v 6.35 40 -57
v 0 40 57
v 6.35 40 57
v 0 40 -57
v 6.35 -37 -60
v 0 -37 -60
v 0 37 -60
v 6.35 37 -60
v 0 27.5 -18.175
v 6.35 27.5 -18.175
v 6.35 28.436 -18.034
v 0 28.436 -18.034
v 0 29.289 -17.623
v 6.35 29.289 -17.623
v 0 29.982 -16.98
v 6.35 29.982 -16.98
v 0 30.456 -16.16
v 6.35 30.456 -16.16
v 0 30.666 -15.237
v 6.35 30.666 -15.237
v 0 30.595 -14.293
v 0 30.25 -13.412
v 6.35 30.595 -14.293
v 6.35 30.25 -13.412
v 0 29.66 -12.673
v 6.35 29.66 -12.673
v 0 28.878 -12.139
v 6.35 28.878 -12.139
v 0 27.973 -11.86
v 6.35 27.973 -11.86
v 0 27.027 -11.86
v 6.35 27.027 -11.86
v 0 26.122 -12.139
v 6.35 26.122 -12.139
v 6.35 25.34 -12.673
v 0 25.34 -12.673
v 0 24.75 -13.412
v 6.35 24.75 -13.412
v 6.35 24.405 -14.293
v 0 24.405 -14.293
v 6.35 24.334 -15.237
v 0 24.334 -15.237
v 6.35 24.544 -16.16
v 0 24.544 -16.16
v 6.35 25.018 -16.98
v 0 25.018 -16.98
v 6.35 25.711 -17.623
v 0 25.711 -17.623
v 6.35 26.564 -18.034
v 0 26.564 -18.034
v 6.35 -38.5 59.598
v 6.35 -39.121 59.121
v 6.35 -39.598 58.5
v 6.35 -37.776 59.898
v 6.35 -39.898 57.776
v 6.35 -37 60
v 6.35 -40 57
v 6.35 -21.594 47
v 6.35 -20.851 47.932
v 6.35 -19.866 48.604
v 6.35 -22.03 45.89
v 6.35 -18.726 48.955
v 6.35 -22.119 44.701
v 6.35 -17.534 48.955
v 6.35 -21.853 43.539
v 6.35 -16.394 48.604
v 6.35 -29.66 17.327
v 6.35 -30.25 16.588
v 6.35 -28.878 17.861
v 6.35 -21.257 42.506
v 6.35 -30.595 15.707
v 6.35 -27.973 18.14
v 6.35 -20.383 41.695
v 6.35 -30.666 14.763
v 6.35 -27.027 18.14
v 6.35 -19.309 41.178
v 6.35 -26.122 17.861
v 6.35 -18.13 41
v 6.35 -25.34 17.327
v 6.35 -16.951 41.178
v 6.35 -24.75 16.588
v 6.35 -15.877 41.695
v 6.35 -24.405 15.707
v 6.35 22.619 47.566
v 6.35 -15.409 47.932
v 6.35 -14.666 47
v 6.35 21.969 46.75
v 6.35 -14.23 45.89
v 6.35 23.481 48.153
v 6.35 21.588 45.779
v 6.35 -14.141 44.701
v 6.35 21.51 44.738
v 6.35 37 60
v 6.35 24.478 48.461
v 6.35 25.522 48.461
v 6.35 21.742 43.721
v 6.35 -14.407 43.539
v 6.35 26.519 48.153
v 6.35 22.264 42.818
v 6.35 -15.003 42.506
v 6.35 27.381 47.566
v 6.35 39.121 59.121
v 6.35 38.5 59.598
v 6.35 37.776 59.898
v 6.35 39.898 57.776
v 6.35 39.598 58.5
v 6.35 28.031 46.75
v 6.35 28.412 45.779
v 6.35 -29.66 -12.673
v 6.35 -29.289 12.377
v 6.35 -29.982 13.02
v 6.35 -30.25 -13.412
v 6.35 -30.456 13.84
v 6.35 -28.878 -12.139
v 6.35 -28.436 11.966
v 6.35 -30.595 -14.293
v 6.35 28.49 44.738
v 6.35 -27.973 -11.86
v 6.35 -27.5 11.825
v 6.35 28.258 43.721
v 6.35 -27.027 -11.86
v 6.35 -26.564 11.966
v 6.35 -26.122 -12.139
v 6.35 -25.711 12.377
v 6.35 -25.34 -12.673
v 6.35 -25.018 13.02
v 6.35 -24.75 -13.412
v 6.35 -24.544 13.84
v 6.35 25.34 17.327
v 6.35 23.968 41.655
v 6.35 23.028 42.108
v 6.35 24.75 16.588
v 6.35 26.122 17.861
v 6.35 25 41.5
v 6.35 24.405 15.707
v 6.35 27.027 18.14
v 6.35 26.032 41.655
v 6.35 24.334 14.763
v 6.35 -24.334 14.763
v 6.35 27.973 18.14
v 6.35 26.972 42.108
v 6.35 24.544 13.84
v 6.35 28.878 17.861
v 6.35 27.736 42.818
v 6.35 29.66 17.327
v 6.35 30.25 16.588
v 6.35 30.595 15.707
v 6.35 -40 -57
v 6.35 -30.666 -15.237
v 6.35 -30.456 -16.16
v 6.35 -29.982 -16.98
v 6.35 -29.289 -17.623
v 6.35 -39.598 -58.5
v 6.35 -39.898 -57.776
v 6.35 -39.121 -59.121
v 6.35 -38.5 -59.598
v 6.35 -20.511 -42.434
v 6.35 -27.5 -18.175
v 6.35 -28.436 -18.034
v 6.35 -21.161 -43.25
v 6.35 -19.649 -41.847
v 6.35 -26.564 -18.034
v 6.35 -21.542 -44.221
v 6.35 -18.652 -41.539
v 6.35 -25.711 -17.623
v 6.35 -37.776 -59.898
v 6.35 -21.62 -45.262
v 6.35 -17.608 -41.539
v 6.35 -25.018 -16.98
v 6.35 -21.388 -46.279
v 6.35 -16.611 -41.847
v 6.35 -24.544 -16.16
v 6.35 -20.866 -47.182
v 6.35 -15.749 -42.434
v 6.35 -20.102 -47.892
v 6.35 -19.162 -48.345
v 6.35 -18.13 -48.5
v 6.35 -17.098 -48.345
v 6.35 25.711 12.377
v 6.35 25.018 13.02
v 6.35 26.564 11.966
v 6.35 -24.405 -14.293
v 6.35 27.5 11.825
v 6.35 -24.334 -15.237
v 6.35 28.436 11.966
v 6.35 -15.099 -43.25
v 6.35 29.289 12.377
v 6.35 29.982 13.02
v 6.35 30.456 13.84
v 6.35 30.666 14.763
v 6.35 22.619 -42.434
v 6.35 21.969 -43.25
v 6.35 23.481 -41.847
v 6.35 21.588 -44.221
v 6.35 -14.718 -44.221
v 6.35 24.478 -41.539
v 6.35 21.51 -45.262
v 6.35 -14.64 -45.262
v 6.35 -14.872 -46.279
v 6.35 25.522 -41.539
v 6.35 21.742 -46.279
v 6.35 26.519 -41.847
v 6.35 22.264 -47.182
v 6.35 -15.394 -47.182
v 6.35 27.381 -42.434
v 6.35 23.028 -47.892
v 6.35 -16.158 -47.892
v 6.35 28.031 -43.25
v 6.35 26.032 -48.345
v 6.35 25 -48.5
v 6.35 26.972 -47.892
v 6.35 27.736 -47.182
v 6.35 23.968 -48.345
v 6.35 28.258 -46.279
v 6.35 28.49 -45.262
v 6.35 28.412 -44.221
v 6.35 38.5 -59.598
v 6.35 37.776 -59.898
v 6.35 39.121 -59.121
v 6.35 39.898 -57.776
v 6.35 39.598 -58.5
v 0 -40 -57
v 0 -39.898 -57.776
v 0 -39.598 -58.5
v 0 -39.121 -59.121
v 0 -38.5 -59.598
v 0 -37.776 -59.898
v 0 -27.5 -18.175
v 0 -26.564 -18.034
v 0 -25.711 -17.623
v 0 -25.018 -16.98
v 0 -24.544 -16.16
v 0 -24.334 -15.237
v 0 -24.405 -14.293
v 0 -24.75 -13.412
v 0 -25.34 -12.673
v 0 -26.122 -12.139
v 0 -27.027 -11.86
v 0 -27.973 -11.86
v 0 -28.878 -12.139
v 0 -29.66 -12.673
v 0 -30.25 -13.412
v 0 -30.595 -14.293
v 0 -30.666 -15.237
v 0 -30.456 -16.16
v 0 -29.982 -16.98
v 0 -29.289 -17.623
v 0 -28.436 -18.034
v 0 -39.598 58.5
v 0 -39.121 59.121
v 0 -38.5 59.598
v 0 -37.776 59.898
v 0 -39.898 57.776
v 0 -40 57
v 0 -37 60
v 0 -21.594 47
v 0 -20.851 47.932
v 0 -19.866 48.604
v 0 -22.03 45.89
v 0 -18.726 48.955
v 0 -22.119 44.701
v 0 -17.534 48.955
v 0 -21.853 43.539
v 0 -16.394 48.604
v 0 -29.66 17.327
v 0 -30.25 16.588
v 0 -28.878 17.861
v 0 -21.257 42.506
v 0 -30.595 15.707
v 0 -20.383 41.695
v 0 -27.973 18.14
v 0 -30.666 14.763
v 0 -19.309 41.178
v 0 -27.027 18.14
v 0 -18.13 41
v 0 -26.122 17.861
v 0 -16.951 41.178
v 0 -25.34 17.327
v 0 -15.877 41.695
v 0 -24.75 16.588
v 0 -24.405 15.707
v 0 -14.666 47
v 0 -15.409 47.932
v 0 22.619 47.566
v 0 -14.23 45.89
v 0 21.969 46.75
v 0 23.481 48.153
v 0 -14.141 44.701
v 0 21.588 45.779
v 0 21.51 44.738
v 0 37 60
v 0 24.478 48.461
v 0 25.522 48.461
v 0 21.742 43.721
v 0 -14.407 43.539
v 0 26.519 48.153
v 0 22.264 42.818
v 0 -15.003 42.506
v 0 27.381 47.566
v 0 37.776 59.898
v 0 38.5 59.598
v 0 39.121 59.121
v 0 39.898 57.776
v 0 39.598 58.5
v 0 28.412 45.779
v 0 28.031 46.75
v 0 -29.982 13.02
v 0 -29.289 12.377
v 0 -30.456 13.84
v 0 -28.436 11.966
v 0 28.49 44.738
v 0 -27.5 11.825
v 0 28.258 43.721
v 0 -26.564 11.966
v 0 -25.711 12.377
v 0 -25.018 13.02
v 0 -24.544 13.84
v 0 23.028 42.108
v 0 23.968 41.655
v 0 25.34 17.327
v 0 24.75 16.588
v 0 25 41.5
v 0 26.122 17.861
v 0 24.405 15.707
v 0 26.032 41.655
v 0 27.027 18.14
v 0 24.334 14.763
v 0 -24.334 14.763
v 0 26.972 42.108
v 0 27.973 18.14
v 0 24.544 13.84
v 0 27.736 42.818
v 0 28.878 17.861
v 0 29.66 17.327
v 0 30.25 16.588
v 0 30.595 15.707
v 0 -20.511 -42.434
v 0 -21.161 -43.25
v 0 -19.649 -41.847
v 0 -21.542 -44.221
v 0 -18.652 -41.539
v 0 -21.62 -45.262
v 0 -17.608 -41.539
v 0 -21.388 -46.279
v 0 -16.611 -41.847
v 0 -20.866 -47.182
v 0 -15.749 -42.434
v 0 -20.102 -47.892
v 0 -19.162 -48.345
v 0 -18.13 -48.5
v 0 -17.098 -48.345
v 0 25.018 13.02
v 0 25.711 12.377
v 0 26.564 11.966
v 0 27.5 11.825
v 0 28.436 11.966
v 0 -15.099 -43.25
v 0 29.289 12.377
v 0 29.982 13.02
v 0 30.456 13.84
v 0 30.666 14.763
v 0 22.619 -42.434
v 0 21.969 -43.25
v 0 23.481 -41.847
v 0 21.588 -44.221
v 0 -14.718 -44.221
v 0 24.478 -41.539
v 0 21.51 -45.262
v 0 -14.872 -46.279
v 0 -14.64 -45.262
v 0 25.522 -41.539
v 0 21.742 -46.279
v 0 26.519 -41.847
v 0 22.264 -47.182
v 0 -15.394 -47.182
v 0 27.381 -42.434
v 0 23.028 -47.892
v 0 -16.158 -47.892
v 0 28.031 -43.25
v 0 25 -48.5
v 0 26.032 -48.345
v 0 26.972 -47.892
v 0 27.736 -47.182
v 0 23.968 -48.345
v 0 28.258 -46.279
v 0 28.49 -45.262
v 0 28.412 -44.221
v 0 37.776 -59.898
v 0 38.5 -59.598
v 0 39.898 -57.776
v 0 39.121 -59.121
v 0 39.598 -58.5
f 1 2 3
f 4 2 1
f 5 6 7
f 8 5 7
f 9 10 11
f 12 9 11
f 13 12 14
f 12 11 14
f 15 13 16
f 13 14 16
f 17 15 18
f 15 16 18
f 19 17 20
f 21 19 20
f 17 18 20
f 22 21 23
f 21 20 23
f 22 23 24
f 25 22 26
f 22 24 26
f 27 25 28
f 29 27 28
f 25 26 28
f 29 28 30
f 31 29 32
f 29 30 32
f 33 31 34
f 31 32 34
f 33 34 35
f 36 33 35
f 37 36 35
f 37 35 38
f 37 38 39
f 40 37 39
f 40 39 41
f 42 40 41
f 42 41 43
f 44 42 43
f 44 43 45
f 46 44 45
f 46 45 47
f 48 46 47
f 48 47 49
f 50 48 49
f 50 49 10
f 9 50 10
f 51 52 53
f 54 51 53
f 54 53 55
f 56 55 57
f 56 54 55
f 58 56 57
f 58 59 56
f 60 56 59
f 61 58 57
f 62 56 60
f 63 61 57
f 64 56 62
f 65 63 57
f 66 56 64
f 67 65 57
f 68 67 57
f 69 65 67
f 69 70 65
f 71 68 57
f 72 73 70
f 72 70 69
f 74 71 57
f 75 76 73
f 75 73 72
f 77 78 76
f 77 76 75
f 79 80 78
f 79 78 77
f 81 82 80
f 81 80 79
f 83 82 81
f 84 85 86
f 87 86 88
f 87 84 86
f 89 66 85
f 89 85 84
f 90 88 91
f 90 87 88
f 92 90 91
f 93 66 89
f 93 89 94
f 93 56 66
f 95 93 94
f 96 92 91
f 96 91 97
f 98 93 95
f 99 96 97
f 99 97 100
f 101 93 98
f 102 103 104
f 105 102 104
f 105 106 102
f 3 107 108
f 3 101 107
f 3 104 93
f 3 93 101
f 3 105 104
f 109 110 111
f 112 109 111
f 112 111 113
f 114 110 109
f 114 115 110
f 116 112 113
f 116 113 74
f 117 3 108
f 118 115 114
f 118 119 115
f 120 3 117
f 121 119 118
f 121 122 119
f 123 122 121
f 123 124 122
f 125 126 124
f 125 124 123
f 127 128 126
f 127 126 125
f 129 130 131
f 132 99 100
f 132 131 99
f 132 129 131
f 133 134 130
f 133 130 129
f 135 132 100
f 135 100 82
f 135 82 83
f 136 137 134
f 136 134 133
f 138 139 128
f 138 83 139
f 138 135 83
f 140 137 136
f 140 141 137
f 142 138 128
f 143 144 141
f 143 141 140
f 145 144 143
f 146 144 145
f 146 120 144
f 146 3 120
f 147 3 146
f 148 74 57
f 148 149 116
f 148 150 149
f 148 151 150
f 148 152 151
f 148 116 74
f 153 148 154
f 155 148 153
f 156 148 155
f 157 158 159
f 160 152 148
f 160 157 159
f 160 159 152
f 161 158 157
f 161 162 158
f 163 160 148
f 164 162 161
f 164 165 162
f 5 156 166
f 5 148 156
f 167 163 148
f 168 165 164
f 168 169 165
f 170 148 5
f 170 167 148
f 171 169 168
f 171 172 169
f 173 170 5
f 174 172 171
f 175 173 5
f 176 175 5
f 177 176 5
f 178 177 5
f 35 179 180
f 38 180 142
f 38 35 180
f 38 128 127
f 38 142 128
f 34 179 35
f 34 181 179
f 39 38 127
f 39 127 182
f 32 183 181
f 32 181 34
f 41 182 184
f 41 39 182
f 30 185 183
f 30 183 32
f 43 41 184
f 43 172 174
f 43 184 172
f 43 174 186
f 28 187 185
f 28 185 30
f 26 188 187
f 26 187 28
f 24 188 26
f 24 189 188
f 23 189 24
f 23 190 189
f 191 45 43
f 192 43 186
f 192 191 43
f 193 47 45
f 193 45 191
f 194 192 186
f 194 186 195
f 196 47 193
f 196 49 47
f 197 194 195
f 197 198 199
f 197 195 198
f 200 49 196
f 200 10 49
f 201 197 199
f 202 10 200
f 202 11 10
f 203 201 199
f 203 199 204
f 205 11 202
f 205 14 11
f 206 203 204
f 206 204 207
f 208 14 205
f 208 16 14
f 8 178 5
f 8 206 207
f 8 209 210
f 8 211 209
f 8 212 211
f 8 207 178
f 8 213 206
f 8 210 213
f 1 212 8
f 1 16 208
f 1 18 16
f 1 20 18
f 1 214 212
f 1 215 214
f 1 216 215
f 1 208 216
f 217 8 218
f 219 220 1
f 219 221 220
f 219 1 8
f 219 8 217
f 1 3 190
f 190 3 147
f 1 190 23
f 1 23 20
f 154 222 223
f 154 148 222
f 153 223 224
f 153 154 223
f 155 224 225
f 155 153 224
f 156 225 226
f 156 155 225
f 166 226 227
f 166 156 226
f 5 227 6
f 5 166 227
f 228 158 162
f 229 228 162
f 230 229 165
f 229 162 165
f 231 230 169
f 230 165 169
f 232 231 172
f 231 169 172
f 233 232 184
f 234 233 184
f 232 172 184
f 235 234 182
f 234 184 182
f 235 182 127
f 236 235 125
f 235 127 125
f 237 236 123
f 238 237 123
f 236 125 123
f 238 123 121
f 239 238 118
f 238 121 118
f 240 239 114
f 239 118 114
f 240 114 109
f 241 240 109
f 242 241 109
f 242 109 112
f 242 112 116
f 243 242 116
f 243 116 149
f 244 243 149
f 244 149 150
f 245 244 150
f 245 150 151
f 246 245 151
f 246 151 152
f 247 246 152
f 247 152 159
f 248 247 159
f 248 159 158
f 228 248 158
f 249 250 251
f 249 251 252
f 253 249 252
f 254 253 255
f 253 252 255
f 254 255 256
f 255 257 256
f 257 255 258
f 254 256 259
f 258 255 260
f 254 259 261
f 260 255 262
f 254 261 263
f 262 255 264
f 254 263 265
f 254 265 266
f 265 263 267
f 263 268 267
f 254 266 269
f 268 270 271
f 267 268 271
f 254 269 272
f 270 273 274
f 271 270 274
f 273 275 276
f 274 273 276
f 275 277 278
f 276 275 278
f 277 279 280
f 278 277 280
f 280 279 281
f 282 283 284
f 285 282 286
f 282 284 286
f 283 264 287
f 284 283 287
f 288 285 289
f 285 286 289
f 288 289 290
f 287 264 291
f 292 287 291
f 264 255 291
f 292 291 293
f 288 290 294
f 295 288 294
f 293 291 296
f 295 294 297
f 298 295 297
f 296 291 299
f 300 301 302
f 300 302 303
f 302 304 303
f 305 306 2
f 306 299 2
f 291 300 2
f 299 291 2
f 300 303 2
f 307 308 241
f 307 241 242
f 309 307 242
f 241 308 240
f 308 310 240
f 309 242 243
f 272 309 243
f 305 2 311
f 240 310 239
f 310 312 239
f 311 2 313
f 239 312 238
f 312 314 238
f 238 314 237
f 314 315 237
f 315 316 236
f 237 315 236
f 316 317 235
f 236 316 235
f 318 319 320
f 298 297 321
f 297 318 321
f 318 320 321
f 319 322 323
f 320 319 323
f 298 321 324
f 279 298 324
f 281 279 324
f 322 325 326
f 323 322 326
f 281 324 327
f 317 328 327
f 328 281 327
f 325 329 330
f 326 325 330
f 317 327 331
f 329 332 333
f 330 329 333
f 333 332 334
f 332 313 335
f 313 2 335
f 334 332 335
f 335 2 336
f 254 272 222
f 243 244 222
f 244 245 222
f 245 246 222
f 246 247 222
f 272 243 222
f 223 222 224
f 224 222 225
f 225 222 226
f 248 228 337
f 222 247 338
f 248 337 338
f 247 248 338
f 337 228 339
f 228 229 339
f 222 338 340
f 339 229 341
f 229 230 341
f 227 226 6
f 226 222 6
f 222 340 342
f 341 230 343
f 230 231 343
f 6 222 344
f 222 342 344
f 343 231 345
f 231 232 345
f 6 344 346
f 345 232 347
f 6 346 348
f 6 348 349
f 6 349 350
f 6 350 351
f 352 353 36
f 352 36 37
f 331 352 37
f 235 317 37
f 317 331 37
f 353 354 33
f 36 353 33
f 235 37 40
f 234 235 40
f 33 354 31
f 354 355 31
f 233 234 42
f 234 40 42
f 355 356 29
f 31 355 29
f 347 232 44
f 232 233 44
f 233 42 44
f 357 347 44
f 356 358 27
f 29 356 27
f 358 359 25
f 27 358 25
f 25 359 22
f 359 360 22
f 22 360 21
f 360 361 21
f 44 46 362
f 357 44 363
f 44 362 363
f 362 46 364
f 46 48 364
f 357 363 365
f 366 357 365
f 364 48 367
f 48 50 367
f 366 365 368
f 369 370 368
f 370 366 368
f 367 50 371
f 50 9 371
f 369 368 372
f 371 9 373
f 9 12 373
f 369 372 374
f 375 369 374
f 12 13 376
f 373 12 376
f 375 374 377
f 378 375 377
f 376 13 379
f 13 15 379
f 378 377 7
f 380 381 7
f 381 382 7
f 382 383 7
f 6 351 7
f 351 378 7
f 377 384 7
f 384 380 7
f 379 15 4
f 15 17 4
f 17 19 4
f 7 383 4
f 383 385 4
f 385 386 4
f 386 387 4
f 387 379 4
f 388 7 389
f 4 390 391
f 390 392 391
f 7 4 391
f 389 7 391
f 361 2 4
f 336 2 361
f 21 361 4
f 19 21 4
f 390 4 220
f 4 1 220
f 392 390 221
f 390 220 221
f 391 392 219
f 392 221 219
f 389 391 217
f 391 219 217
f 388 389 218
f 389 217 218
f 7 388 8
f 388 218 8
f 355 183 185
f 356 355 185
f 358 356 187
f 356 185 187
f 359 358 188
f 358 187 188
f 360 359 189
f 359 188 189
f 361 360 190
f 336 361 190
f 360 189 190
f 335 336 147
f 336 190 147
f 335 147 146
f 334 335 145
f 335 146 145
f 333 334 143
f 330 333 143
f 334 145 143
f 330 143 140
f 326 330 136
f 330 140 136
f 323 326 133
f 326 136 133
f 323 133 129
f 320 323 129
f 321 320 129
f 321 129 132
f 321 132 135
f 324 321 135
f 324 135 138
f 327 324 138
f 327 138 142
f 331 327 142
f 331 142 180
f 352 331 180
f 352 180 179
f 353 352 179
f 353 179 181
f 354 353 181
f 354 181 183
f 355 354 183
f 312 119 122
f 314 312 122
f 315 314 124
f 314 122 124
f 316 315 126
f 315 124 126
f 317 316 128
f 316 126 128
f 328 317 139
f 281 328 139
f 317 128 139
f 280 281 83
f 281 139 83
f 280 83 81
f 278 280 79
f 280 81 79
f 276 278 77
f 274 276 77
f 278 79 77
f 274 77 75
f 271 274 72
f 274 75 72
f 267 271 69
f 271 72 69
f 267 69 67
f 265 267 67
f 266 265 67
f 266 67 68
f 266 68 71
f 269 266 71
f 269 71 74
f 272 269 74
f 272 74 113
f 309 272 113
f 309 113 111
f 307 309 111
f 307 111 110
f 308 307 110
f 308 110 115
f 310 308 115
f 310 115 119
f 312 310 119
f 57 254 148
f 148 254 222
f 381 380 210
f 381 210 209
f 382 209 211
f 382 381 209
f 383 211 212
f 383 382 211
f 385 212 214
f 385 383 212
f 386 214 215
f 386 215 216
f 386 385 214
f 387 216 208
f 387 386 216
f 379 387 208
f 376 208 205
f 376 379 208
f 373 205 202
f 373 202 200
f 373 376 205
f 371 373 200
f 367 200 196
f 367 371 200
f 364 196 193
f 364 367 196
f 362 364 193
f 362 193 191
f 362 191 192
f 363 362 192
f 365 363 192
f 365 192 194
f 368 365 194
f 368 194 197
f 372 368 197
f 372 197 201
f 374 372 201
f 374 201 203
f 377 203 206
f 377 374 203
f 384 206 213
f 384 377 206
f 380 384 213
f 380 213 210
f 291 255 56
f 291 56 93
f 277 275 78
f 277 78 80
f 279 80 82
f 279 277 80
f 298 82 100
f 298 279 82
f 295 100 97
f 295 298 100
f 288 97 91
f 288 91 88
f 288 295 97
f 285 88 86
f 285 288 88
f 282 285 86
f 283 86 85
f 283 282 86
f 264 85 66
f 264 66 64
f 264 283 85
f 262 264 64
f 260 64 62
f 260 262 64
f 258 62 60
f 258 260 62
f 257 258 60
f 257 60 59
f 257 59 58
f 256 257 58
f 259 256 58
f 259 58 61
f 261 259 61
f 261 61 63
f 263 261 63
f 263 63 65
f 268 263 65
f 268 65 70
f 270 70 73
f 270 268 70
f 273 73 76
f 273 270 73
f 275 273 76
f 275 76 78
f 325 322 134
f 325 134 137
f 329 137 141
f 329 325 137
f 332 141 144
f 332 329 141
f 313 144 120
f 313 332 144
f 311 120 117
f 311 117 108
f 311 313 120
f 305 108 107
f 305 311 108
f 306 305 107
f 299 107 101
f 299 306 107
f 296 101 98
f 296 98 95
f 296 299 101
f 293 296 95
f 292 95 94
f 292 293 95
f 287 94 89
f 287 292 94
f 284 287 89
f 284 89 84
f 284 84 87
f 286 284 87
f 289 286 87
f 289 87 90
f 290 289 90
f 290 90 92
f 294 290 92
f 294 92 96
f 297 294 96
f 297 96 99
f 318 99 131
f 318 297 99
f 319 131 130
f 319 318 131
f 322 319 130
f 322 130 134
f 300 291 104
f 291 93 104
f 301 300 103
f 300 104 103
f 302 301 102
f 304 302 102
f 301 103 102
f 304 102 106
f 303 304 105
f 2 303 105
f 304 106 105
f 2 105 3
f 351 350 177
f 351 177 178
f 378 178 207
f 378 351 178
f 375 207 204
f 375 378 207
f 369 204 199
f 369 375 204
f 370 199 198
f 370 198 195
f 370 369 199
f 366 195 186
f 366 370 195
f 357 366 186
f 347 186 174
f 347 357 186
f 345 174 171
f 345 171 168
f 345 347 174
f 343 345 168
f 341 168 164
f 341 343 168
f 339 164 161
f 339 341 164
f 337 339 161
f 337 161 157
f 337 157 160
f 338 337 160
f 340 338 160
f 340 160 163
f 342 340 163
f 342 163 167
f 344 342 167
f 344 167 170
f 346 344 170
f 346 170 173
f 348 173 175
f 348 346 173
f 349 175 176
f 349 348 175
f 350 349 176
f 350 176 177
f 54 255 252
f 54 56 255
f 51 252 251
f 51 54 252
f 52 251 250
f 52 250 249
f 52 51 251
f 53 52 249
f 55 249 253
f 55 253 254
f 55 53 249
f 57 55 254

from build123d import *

# Parameters (mm, degrees)
SKETCH1_W           = 120
SKETCH1_H           = 80
SKETCH1_R           = 3.5
SKETCH1_R_2         = 4
BOSS_EXTRUDE1_DEPTH = 6.35
FILLET1_R           = 3
SKETCH2_R           = 3.175
CUT_EXTRUDE1_DEPTH  = 10


with BuildPart() as part:
    # Sketch1 → Boss-Extrude1 (new body)
    with BuildSketch(Plane(origin=(0, 0, 0), x_dir=(0, 0, -1), z_dir=(1, 0, 0))):
        Rectangle(SKETCH1_W, SKETCH1_H)
        with Locations((45, 25)):
            Circle(SKETCH1_R, mode=Mode.SUBTRACT)
        with Locations((-45, 25)):
            Circle(SKETCH1_R, mode=Mode.SUBTRACT)
        with Locations((-45, -18.13)):
            Circle(SKETCH1_R_2, mode=Mode.SUBTRACT)
        with Locations((45, -18.13)):
            Circle(SKETCH1_R, mode=Mode.SUBTRACT)
    extrude(amount=BOSS_EXTRUDE1_DEPTH)

    # Fillet1
    fillet1_edges = [part.edges().sort_by_distance(p)[0] for p in [
        (3.175, -40, -60),
        (3.175, -40, 60),
        (3.175, 40, 60),
        (3.175, 40, -60),
    ]]
    fillet(fillet1_edges, radius=FILLET1_R)

    # Sketch2 → Cut-Extrude1 (cut)
    with BuildSketch(Plane(origin=(6.35, 0, 0), x_dir=(0, 0, -1), z_dir=(1, 0, 0))):
        with Locations((-15, 27.5)):
            Circle(SKETCH2_R)
        with Locations((15, 27.5)):
            Circle(SKETCH2_R)
        with Locations((15, -27.5)):
            Circle(SKETCH2_R)
        with Locations((-15, -27.5)):
            Circle(SKETCH2_R)
    extrude(amount=-CUT_EXTRUDE1_DEPTH, mode=Mode.SUBTRACT)


solid = part.part
